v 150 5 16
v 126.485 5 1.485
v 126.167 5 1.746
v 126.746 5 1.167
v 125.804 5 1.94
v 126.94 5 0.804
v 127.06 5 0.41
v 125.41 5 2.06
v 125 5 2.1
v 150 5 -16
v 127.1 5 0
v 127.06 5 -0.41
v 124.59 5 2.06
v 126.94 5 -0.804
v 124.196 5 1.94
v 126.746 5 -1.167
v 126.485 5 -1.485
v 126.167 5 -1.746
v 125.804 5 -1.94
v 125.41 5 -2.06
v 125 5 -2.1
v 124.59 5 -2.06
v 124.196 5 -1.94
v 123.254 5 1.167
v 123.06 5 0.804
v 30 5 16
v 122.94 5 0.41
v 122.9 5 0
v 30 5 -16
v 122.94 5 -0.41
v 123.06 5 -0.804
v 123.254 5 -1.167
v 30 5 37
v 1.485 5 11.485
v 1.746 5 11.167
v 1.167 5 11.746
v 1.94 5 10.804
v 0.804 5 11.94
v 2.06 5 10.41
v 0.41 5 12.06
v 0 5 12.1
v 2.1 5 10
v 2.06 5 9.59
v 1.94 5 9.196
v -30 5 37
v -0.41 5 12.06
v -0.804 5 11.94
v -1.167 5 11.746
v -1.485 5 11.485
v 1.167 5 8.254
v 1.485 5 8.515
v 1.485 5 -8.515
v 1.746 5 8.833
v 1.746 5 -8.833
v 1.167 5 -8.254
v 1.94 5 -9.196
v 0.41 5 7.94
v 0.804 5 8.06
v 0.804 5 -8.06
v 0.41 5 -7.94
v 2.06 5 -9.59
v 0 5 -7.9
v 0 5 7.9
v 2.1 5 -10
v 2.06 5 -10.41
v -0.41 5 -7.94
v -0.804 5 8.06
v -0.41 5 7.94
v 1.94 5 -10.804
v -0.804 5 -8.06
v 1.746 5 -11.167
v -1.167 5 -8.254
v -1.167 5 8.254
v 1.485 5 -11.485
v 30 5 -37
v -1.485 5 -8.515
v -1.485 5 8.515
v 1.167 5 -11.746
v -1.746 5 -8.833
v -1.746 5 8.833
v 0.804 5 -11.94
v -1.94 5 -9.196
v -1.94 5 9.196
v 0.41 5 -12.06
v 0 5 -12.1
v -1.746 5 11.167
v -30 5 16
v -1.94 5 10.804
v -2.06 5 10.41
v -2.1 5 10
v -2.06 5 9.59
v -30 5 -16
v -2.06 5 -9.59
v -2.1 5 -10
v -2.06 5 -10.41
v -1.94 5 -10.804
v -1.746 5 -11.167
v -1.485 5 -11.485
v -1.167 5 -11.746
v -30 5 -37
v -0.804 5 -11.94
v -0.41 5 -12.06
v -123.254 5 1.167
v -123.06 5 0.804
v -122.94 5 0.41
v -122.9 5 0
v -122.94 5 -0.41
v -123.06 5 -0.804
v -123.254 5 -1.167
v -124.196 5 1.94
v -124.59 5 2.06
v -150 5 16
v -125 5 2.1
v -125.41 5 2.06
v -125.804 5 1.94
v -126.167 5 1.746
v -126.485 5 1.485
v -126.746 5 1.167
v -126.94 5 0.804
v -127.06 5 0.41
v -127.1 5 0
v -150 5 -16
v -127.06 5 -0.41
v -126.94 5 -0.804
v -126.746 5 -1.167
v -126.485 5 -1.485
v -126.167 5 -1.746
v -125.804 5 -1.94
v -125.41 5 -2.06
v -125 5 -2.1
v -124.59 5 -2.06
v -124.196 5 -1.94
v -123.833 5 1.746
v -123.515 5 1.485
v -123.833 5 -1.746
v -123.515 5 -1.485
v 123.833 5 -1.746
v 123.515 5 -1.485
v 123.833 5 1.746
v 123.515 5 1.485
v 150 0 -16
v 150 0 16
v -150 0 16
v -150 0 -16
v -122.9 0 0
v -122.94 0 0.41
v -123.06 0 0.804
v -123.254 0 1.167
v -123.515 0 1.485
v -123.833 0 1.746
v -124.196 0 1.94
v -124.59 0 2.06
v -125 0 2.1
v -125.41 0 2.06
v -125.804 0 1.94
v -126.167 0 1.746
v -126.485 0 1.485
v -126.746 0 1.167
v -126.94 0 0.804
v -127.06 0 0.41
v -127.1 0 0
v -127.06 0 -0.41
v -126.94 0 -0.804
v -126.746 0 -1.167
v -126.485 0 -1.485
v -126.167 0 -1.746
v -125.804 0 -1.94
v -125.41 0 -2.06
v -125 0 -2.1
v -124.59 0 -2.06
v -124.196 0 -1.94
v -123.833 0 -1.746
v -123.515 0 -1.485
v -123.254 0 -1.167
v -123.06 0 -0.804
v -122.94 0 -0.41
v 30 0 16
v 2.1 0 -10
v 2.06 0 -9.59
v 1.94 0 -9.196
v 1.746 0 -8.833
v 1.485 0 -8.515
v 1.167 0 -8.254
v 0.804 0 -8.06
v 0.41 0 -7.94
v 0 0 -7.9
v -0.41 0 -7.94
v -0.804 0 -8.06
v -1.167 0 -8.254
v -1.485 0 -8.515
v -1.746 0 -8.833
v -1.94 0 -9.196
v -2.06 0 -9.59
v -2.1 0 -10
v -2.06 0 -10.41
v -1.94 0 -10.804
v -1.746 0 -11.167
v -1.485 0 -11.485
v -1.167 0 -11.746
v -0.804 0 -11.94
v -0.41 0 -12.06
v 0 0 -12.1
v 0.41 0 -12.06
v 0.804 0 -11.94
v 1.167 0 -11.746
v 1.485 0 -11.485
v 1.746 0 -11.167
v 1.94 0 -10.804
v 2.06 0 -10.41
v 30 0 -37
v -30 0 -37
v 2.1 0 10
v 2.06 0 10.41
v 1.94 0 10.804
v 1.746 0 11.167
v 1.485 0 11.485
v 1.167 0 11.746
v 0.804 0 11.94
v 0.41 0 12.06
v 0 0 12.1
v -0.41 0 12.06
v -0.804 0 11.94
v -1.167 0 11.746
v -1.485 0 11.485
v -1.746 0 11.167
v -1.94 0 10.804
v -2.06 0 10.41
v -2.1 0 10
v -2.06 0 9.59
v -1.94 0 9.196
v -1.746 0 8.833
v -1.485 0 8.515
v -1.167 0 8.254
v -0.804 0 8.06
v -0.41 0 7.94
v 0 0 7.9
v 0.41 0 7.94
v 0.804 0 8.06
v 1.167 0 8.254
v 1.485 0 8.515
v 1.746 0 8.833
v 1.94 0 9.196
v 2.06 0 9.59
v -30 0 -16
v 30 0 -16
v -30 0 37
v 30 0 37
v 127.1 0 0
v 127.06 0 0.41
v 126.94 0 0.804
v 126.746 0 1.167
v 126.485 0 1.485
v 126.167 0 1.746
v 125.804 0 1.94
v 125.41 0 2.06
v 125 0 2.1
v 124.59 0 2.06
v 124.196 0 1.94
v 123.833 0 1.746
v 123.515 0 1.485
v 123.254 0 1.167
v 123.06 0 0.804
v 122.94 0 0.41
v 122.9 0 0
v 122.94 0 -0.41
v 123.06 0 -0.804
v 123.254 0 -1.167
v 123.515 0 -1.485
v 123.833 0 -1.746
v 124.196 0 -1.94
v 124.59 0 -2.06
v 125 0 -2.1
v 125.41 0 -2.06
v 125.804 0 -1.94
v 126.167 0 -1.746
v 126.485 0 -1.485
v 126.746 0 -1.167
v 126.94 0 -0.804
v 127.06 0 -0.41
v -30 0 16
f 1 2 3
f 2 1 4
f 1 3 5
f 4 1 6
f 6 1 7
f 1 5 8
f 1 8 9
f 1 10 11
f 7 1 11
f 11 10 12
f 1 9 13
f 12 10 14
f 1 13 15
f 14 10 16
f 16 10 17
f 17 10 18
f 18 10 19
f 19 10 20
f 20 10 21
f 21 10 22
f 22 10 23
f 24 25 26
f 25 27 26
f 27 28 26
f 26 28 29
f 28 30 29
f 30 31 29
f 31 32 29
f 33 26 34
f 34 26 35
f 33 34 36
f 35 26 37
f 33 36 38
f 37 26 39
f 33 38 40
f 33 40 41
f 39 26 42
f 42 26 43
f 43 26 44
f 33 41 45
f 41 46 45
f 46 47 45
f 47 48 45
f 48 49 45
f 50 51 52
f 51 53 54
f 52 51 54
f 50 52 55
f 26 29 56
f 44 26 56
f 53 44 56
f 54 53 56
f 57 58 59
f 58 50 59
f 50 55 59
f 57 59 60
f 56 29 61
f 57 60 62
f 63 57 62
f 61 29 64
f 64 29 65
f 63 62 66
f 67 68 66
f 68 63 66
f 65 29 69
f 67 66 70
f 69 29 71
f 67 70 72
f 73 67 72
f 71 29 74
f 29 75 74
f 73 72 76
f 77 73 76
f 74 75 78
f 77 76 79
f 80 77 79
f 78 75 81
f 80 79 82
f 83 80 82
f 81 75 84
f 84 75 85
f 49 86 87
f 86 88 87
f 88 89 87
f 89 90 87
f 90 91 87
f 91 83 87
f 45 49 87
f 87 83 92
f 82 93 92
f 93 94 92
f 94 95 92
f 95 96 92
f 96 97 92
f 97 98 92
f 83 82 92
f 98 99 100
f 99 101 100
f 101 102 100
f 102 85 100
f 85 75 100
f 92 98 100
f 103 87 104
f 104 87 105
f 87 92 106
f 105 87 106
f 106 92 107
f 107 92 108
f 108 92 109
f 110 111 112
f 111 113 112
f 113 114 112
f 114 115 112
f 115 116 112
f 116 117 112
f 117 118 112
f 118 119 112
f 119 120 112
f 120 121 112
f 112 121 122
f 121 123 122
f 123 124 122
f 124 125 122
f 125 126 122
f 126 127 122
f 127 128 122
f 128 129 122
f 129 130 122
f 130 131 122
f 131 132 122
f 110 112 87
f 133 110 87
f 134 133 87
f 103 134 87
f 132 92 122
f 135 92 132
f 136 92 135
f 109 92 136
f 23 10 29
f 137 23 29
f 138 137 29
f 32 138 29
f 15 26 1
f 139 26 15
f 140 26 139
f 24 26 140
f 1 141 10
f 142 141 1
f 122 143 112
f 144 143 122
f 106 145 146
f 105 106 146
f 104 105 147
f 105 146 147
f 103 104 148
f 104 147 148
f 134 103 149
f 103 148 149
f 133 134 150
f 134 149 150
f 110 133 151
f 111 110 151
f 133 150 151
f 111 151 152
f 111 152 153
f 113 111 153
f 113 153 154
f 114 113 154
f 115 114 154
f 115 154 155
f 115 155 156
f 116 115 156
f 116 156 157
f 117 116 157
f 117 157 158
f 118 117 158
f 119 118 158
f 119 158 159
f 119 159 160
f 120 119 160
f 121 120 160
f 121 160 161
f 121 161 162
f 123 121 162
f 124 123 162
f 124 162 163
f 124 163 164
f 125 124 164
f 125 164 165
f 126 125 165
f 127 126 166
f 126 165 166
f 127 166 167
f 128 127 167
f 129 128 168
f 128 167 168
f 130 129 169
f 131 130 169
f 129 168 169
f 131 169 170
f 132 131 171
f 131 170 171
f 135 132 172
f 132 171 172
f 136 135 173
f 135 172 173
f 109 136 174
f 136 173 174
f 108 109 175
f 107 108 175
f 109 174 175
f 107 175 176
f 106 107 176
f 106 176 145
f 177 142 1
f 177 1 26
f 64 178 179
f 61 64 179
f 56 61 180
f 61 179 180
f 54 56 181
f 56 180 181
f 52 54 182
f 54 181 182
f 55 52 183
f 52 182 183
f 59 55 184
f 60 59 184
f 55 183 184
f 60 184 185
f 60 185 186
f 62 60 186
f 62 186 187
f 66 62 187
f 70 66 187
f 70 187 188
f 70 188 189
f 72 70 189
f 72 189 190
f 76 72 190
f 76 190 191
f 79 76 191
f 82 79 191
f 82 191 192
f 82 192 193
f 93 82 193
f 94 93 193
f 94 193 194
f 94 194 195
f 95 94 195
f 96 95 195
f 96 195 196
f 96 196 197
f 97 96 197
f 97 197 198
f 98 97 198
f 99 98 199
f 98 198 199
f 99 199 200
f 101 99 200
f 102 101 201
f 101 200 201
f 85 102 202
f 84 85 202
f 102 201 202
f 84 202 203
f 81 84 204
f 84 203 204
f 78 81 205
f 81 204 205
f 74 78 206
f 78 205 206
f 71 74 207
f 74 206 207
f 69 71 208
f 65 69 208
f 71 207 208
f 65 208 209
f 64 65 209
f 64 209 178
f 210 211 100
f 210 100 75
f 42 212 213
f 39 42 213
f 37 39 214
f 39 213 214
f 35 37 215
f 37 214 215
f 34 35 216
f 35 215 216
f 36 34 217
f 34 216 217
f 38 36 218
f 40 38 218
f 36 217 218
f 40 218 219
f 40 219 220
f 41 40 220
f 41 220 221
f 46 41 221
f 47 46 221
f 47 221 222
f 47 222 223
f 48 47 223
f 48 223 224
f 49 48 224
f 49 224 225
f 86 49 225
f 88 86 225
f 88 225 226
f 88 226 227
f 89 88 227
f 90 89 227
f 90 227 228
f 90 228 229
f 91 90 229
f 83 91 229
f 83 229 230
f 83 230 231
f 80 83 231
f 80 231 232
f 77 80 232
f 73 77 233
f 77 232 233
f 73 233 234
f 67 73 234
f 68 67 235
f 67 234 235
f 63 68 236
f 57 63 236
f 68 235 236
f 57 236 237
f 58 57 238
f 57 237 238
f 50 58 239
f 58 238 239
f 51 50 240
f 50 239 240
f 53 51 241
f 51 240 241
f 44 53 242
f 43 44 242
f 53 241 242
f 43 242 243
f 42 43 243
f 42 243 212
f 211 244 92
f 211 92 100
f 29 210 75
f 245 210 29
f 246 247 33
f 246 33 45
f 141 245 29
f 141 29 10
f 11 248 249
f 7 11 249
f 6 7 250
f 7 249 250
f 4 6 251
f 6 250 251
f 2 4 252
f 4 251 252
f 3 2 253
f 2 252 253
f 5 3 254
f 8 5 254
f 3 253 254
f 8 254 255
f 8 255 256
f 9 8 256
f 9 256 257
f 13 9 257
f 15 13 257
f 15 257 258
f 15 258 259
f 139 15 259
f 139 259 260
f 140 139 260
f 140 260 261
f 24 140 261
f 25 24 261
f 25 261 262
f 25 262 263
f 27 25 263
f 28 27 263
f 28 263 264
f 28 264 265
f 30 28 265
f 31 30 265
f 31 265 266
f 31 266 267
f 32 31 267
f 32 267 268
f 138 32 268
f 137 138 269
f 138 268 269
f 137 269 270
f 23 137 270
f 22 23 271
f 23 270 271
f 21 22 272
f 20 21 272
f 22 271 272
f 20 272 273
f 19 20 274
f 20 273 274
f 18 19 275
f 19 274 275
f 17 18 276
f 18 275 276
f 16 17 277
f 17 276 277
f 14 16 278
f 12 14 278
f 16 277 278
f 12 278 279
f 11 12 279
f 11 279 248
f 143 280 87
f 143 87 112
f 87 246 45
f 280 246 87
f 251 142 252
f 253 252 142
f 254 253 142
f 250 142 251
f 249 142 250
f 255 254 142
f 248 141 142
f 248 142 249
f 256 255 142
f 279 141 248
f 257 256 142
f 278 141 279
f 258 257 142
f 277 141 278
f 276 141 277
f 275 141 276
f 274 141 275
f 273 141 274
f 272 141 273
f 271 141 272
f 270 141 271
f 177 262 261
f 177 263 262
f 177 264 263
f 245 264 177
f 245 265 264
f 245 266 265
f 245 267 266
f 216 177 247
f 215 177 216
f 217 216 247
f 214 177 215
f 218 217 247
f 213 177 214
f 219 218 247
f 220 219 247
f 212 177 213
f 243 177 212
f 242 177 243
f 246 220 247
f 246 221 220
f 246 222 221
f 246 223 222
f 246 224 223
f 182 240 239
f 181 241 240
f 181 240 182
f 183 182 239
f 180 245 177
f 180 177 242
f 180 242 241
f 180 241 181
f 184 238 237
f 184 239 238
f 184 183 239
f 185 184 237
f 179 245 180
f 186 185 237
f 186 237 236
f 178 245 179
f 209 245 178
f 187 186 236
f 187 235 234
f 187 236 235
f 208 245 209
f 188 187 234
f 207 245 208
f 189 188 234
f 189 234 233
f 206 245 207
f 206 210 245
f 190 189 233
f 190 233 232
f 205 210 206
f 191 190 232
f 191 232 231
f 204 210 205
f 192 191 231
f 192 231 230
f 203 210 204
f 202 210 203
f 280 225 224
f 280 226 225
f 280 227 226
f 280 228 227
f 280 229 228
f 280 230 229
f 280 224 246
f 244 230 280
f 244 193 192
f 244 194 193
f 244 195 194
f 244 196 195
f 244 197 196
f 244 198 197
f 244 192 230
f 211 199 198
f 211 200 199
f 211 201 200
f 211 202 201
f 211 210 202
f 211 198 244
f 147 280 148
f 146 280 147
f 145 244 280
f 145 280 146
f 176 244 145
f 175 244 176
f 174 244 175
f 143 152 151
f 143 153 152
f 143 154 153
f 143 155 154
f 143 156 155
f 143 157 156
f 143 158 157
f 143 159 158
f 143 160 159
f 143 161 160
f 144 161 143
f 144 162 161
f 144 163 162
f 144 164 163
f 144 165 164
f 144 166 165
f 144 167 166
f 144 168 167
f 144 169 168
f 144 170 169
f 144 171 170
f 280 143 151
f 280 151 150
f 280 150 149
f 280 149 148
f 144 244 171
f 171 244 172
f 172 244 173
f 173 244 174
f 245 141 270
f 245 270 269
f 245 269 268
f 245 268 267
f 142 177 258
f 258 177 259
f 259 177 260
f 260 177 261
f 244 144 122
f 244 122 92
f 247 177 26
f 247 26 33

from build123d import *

# Parameters (mm, degrees)
EXTRUDE_1_DEPTH     = 5
SKETCH_2_R          = 2.1
CUT_EXTRUDE_1_DEPTH = 6
FILLET_1_R          = 5
SKETCH_3_R          = 2.5
CUT_EXTRUDE_2_DEPTH = 6
SKETCH_4_R          = 2.1
CUT_EXTRUDE_3_DEPTH = 6
SKETCH_5_OUTSIDE_W  = 532.64
SKETCH_5_OUTSIDE_H  = 472.64
CUT_EXTRUDE_4_DEPTH = 6


with BuildPart() as part:
    # 草图1 → 凸台-拉伸1 (new body)
    with BuildSketch(Plane(origin=(0, 0, 0), x_dir=(1, 0, 0), z_dir=(0, 1, 0))):
        Polygon((-180, 180), (-180, 103), (-80, 103), (-80, 180), (80, 180), (80, 103), (180, 103), (180, 180), (210, 180), (210, -180), (180, -180), (180, -103), (80, -103), (80, -180), (-80, -180), (-80, -103), (-180, -103), (-180, -180), (-210, -180), (-210, 180), align=None)
    extrude(amount=EXTRUDE_1_DEPTH)

    # 草图2 → 切除-拉伸1 (cut, through all)
    with BuildSketch(Plane(origin=(0, 5, 0), x_dir=(1, 0, 0), z_dir=(0, 1, 0))):
        with Locations((115, -88.5)):
            Circle(SKETCH_2_R)
        with Locations((145, -88.5)):
            Circle(SKETCH_2_R)
        with Locations((130, -95.5)):
            Circle(SKETCH_2_R)
        with Locations((130, 95.5)):
            Circle(SKETCH_2_R)
        with Locations((145, 88.5)):
            Circle(SKETCH_2_R)
        with Locations((115, 88.5)):
            Circle(SKETCH_2_R)
        with Locations((-115, 88.5)):
            Circle(SKETCH_2_R)
        with Locations((-145, 88.5)):
            Circle(SKETCH_2_R)
        with Locations((-130, 95.5)):
            Circle(SKETCH_2_R)
        with Locations((-130, -95.5)):
            Circle(SKETCH_2_R)
        with Locations((-145, -88.5)):
            Circle(SKETCH_2_R)
        with Locations((-115, -88.5)):
            Circle(SKETCH_2_R)
    extrude(amount=-CUT_EXTRUDE_1_DEPTH, mode=Mode.SUBTRACT)

    # 圆角1
    fillet_1_edges = [part.edges().sort_by_distance(p)[0] for p in [
        (180, 2.5, 180),
        (80, 2.5, 180),
        (-80, 2.5, 180),
        (-180, 2.5, 180),
        (-180, 2.5, -180),
        (-80, 2.5, -180),
        (80, 2.5, -180),
        (180, 2.5, -180),
    ]]
    fillet(fillet_1_edges, radius=FILLET_1_R)

    # 草图3 → 切除-拉伸2 (cut, through all)
    with BuildSketch(Plane.XZ):
        with Locations((84.75, 31.75)):
            Circle(SKETCH_3_R)
        with Locations((84.75, -31.75)):
            Circle(SKETCH_3_R)
        with Locations((171.25, 31.75)):
            Circle(SKETCH_3_R)
        with Locations((171.25, -31.75)):
            Circle(SKETCH_3_R)
        with Locations((-171.25, -31.75)):
            Circle(SKETCH_3_R)
        with Locations((-171.25, 31.75)):
            Circle(SKETCH_3_R)
        with Locations((-84.75, -31.75)):
            Circle(SKETCH_3_R)
        with Locations((-84.75, 31.75)):
            Circle(SKETCH_3_R)
    extrude(amount=-CUT_EXTRUDE_2_DEPTH, mode=Mode.SUBTRACT)

    # 草图4 → 切除-拉伸3 (cut, through all)
    with BuildSketch(Plane.XZ):
        with Locations((-125, 0)):
            Circle(SKETCH_4_R)
        with Locations((125, 0)):
            Circle(SKETCH_4_R)
        with Locations((0, 10)):
            Circle(SKETCH_4_R)
        with Locations((0, -10)):
            Circle(SKETCH_4_R)
    extrude(amount=-CUT_EXTRUDE_3_DEPTH, mode=Mode.SUBTRACT)

    # 草图5 outside → 切除-拉伸4 (cut, through all)
    with BuildSketch(Plane.XZ):
        Rectangle(SKETCH_5_OUTSIDE_W, SKETCH_5_OUTSIDE_H)
        Polygon((-150, 16), (-150, -16), (-30, -16), (-30, -37), (30, -37), (30, -16), (150, -16), (150, 16), (30, 16), (30, 37), (-30, 37), (-30, 16), align=None, mode=Mode.SUBTRACT)
    extrude(amount=-CUT_EXTRUDE_4_DEPTH, mode=Mode.SUBTRACT)


solid = part.part
